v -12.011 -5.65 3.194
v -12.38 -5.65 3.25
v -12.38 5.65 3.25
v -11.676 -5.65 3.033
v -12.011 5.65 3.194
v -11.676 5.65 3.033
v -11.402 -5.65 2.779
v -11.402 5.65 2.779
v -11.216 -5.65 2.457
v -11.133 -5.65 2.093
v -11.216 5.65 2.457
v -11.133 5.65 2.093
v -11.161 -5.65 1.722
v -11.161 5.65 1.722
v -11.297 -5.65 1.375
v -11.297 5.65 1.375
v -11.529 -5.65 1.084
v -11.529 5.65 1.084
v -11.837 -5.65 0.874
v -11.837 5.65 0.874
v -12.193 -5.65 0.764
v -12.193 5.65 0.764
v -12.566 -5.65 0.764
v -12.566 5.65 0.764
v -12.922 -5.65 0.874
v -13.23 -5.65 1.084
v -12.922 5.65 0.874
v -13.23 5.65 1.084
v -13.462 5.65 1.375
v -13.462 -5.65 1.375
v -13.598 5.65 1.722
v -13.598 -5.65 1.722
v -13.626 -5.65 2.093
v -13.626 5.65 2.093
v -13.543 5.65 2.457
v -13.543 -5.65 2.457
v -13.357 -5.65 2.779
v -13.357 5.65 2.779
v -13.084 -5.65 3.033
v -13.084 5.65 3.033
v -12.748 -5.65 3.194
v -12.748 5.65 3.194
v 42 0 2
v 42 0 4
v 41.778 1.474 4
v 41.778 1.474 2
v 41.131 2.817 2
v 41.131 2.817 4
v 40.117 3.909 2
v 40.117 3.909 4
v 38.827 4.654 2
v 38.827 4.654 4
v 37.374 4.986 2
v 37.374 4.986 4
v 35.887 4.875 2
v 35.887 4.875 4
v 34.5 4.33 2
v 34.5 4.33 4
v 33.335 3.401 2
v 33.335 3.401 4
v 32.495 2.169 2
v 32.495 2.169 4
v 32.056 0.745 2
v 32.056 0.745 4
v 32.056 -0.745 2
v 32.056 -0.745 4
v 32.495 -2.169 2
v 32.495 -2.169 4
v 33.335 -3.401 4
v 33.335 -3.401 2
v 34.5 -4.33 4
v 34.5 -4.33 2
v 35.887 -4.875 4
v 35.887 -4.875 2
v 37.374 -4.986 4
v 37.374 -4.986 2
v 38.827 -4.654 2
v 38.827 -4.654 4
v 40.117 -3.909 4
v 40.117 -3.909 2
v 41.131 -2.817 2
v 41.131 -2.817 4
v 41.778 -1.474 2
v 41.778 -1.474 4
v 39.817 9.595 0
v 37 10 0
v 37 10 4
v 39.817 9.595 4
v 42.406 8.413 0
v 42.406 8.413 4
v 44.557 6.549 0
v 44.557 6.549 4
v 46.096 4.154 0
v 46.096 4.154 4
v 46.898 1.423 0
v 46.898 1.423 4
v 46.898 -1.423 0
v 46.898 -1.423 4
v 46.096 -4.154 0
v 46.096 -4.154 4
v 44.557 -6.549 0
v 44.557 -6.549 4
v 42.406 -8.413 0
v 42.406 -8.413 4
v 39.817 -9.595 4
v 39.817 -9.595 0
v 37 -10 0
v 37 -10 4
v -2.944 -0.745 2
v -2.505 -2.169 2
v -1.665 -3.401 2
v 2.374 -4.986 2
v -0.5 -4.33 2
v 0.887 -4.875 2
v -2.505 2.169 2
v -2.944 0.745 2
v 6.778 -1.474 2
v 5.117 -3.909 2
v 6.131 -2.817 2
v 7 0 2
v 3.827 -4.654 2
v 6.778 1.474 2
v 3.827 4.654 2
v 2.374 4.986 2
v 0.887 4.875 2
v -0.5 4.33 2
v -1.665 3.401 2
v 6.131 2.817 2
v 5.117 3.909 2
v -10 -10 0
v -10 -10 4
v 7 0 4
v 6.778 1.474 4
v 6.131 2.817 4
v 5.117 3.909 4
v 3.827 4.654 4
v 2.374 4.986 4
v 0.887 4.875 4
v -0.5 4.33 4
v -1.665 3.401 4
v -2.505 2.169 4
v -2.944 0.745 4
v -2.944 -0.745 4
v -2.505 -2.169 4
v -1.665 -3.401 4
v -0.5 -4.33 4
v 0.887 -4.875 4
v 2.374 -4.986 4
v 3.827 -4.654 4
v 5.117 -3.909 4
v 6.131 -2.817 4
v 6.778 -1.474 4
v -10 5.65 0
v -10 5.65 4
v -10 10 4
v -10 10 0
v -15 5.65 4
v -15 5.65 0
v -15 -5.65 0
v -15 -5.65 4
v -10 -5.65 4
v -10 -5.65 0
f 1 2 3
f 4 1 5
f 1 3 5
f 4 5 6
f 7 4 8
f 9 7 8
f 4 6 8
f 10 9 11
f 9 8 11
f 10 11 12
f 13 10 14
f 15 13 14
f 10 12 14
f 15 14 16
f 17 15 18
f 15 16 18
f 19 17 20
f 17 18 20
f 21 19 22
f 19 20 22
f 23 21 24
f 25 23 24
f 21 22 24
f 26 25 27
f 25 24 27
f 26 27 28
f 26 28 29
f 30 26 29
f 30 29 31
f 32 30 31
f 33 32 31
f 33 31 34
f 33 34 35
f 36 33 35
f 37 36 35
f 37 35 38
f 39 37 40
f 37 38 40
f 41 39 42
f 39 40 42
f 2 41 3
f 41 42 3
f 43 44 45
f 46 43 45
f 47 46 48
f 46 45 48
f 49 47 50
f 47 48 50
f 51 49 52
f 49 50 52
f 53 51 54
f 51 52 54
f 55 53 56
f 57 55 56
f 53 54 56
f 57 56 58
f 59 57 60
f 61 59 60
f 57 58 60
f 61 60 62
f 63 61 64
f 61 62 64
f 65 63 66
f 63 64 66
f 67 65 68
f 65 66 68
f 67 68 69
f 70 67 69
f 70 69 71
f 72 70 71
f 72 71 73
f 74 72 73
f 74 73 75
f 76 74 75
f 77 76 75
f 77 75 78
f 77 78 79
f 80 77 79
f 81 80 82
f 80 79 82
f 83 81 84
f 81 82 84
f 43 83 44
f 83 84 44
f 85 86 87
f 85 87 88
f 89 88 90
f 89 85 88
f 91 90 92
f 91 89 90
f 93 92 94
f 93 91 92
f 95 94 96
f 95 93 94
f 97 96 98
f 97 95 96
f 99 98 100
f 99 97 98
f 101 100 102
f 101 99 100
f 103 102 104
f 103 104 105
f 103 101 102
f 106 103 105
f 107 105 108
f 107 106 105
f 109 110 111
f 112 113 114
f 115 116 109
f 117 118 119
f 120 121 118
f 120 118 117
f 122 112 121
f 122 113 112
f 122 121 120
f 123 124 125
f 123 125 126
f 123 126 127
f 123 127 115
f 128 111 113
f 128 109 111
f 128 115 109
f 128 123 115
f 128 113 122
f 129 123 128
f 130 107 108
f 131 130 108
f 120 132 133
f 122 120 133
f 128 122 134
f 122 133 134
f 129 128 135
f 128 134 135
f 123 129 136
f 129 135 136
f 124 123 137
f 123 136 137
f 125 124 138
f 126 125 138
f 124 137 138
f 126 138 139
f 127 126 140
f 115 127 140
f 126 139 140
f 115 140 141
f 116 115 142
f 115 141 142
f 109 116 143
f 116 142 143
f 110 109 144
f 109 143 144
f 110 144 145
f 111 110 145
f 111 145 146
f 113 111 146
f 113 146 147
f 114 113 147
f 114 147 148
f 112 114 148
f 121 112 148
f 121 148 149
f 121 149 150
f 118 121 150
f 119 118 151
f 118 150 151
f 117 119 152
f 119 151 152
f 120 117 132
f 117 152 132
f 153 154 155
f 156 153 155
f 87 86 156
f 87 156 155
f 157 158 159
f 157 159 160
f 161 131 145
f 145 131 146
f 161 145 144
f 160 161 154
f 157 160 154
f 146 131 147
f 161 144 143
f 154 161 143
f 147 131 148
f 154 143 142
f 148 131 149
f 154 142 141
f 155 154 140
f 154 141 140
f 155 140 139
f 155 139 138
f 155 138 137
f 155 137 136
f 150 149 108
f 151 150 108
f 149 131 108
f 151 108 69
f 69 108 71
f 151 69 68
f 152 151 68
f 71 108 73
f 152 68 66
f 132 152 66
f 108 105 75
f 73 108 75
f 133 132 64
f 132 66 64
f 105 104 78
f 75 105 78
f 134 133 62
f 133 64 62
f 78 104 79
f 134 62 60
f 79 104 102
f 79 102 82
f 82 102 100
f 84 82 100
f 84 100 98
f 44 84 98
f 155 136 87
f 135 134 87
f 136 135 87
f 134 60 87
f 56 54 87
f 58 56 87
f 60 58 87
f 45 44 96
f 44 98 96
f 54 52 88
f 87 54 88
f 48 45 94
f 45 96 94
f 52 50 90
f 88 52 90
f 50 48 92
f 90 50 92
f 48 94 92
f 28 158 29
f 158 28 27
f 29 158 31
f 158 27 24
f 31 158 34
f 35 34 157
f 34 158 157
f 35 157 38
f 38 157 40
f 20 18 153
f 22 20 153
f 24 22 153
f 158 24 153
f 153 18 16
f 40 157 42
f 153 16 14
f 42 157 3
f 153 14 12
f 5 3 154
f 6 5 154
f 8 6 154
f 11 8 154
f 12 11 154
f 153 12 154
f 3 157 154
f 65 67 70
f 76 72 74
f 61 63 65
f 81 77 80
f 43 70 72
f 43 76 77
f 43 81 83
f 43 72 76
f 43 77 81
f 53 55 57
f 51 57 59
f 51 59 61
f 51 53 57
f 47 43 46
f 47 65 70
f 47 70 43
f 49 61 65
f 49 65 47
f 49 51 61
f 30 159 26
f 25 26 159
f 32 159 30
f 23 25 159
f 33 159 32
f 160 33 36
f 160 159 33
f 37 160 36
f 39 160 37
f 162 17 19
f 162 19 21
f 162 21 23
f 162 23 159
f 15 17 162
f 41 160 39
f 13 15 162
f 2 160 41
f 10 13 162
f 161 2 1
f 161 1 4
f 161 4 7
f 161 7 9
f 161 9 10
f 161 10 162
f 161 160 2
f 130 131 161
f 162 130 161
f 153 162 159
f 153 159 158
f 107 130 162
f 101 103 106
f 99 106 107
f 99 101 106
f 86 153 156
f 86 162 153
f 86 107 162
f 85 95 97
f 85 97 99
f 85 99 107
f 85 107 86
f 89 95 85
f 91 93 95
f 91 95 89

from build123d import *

# Parameters (mm, degrees)
EXTRUDE_1_DEPTH     = 4
SKETCH_2_W          = 4
SKETCH_2_H          = 20
EXTRUDE_2_DEPTH     = 5
SKETCH_3_W          = 5
SKETCH_3_H          = 4.35
CUT_EXTRUDE_1_DEPTH = 4
SKETCH_4_R          = 1.25
CUT_EXTRUDE_2_DEPTH = 11.3
SKETCH_6_R          = 5
CUT_EXTRUDE_4_DEPTH = 2


with BuildPart() as part:
    # 草图1 → 凸台-拉伸1 (new body)
    with BuildSketch(Plane.XY):
        with BuildLine():
            Line((0, 10), (37, 10))
            ThreePointArc((37, 10), (47, 0), (37, -10))
            Line((37, -10), (0, -10))
            Line((0, -10), (-10, -10))
            Line((-10, -10), (-10, 10))
            Line((-10, 10), (0, 10))
        make_face()
    extrude(amount=EXTRUDE_1_DEPTH)

    # 草图2 → 凸台-拉伸2 (add)
    with BuildSketch(Plane.ZY.offset(10)):
        with Locations((2, 0)):
            Rectangle(SKETCH_2_W, SKETCH_2_H)
    extrude(amount=EXTRUDE_2_DEPTH)

    # 草图3 → 切除-拉伸1 (cut)
    with BuildSketch(Plane.XY.offset(4)):
        with Locations((-12.5, 7.825)):
            Rectangle(SKETCH_3_W, SKETCH_3_H)
        with Locations((-12.5, -7.825)):
            Rectangle(SKETCH_3_W, SKETCH_3_H)
    extrude(amount=-CUT_EXTRUDE_1_DEPTH, mode=Mode.SUBTRACT)

    # 草图4 → 切除-拉伸2 (cut)
    with BuildSketch(Plane(origin=(0, 5.65, 0), x_dir=(1, 0, 0), z_dir=(0, 1, 0))):
        with Locations(Location((-12.379659001, -2, 0), (0, 0, 270))):
            Circle(SKETCH_4_R)
    extrude(amount=-CUT_EXTRUDE_2_DEPTH, mode=Mode.SUBTRACT)

    # 草图6 → 切除-拉伸4 (cut)
    with BuildSketch(Plane.XY.offset(4)):
        with Locations((37, 0)):
            Circle(SKETCH_6_R)
        with Locations((2, 0)):
            Circle(SKETCH_6_R)
    extrude(amount=-CUT_EXTRUDE_4_DEPTH, mode=Mode.SUBTRACT)


solid = part.part
